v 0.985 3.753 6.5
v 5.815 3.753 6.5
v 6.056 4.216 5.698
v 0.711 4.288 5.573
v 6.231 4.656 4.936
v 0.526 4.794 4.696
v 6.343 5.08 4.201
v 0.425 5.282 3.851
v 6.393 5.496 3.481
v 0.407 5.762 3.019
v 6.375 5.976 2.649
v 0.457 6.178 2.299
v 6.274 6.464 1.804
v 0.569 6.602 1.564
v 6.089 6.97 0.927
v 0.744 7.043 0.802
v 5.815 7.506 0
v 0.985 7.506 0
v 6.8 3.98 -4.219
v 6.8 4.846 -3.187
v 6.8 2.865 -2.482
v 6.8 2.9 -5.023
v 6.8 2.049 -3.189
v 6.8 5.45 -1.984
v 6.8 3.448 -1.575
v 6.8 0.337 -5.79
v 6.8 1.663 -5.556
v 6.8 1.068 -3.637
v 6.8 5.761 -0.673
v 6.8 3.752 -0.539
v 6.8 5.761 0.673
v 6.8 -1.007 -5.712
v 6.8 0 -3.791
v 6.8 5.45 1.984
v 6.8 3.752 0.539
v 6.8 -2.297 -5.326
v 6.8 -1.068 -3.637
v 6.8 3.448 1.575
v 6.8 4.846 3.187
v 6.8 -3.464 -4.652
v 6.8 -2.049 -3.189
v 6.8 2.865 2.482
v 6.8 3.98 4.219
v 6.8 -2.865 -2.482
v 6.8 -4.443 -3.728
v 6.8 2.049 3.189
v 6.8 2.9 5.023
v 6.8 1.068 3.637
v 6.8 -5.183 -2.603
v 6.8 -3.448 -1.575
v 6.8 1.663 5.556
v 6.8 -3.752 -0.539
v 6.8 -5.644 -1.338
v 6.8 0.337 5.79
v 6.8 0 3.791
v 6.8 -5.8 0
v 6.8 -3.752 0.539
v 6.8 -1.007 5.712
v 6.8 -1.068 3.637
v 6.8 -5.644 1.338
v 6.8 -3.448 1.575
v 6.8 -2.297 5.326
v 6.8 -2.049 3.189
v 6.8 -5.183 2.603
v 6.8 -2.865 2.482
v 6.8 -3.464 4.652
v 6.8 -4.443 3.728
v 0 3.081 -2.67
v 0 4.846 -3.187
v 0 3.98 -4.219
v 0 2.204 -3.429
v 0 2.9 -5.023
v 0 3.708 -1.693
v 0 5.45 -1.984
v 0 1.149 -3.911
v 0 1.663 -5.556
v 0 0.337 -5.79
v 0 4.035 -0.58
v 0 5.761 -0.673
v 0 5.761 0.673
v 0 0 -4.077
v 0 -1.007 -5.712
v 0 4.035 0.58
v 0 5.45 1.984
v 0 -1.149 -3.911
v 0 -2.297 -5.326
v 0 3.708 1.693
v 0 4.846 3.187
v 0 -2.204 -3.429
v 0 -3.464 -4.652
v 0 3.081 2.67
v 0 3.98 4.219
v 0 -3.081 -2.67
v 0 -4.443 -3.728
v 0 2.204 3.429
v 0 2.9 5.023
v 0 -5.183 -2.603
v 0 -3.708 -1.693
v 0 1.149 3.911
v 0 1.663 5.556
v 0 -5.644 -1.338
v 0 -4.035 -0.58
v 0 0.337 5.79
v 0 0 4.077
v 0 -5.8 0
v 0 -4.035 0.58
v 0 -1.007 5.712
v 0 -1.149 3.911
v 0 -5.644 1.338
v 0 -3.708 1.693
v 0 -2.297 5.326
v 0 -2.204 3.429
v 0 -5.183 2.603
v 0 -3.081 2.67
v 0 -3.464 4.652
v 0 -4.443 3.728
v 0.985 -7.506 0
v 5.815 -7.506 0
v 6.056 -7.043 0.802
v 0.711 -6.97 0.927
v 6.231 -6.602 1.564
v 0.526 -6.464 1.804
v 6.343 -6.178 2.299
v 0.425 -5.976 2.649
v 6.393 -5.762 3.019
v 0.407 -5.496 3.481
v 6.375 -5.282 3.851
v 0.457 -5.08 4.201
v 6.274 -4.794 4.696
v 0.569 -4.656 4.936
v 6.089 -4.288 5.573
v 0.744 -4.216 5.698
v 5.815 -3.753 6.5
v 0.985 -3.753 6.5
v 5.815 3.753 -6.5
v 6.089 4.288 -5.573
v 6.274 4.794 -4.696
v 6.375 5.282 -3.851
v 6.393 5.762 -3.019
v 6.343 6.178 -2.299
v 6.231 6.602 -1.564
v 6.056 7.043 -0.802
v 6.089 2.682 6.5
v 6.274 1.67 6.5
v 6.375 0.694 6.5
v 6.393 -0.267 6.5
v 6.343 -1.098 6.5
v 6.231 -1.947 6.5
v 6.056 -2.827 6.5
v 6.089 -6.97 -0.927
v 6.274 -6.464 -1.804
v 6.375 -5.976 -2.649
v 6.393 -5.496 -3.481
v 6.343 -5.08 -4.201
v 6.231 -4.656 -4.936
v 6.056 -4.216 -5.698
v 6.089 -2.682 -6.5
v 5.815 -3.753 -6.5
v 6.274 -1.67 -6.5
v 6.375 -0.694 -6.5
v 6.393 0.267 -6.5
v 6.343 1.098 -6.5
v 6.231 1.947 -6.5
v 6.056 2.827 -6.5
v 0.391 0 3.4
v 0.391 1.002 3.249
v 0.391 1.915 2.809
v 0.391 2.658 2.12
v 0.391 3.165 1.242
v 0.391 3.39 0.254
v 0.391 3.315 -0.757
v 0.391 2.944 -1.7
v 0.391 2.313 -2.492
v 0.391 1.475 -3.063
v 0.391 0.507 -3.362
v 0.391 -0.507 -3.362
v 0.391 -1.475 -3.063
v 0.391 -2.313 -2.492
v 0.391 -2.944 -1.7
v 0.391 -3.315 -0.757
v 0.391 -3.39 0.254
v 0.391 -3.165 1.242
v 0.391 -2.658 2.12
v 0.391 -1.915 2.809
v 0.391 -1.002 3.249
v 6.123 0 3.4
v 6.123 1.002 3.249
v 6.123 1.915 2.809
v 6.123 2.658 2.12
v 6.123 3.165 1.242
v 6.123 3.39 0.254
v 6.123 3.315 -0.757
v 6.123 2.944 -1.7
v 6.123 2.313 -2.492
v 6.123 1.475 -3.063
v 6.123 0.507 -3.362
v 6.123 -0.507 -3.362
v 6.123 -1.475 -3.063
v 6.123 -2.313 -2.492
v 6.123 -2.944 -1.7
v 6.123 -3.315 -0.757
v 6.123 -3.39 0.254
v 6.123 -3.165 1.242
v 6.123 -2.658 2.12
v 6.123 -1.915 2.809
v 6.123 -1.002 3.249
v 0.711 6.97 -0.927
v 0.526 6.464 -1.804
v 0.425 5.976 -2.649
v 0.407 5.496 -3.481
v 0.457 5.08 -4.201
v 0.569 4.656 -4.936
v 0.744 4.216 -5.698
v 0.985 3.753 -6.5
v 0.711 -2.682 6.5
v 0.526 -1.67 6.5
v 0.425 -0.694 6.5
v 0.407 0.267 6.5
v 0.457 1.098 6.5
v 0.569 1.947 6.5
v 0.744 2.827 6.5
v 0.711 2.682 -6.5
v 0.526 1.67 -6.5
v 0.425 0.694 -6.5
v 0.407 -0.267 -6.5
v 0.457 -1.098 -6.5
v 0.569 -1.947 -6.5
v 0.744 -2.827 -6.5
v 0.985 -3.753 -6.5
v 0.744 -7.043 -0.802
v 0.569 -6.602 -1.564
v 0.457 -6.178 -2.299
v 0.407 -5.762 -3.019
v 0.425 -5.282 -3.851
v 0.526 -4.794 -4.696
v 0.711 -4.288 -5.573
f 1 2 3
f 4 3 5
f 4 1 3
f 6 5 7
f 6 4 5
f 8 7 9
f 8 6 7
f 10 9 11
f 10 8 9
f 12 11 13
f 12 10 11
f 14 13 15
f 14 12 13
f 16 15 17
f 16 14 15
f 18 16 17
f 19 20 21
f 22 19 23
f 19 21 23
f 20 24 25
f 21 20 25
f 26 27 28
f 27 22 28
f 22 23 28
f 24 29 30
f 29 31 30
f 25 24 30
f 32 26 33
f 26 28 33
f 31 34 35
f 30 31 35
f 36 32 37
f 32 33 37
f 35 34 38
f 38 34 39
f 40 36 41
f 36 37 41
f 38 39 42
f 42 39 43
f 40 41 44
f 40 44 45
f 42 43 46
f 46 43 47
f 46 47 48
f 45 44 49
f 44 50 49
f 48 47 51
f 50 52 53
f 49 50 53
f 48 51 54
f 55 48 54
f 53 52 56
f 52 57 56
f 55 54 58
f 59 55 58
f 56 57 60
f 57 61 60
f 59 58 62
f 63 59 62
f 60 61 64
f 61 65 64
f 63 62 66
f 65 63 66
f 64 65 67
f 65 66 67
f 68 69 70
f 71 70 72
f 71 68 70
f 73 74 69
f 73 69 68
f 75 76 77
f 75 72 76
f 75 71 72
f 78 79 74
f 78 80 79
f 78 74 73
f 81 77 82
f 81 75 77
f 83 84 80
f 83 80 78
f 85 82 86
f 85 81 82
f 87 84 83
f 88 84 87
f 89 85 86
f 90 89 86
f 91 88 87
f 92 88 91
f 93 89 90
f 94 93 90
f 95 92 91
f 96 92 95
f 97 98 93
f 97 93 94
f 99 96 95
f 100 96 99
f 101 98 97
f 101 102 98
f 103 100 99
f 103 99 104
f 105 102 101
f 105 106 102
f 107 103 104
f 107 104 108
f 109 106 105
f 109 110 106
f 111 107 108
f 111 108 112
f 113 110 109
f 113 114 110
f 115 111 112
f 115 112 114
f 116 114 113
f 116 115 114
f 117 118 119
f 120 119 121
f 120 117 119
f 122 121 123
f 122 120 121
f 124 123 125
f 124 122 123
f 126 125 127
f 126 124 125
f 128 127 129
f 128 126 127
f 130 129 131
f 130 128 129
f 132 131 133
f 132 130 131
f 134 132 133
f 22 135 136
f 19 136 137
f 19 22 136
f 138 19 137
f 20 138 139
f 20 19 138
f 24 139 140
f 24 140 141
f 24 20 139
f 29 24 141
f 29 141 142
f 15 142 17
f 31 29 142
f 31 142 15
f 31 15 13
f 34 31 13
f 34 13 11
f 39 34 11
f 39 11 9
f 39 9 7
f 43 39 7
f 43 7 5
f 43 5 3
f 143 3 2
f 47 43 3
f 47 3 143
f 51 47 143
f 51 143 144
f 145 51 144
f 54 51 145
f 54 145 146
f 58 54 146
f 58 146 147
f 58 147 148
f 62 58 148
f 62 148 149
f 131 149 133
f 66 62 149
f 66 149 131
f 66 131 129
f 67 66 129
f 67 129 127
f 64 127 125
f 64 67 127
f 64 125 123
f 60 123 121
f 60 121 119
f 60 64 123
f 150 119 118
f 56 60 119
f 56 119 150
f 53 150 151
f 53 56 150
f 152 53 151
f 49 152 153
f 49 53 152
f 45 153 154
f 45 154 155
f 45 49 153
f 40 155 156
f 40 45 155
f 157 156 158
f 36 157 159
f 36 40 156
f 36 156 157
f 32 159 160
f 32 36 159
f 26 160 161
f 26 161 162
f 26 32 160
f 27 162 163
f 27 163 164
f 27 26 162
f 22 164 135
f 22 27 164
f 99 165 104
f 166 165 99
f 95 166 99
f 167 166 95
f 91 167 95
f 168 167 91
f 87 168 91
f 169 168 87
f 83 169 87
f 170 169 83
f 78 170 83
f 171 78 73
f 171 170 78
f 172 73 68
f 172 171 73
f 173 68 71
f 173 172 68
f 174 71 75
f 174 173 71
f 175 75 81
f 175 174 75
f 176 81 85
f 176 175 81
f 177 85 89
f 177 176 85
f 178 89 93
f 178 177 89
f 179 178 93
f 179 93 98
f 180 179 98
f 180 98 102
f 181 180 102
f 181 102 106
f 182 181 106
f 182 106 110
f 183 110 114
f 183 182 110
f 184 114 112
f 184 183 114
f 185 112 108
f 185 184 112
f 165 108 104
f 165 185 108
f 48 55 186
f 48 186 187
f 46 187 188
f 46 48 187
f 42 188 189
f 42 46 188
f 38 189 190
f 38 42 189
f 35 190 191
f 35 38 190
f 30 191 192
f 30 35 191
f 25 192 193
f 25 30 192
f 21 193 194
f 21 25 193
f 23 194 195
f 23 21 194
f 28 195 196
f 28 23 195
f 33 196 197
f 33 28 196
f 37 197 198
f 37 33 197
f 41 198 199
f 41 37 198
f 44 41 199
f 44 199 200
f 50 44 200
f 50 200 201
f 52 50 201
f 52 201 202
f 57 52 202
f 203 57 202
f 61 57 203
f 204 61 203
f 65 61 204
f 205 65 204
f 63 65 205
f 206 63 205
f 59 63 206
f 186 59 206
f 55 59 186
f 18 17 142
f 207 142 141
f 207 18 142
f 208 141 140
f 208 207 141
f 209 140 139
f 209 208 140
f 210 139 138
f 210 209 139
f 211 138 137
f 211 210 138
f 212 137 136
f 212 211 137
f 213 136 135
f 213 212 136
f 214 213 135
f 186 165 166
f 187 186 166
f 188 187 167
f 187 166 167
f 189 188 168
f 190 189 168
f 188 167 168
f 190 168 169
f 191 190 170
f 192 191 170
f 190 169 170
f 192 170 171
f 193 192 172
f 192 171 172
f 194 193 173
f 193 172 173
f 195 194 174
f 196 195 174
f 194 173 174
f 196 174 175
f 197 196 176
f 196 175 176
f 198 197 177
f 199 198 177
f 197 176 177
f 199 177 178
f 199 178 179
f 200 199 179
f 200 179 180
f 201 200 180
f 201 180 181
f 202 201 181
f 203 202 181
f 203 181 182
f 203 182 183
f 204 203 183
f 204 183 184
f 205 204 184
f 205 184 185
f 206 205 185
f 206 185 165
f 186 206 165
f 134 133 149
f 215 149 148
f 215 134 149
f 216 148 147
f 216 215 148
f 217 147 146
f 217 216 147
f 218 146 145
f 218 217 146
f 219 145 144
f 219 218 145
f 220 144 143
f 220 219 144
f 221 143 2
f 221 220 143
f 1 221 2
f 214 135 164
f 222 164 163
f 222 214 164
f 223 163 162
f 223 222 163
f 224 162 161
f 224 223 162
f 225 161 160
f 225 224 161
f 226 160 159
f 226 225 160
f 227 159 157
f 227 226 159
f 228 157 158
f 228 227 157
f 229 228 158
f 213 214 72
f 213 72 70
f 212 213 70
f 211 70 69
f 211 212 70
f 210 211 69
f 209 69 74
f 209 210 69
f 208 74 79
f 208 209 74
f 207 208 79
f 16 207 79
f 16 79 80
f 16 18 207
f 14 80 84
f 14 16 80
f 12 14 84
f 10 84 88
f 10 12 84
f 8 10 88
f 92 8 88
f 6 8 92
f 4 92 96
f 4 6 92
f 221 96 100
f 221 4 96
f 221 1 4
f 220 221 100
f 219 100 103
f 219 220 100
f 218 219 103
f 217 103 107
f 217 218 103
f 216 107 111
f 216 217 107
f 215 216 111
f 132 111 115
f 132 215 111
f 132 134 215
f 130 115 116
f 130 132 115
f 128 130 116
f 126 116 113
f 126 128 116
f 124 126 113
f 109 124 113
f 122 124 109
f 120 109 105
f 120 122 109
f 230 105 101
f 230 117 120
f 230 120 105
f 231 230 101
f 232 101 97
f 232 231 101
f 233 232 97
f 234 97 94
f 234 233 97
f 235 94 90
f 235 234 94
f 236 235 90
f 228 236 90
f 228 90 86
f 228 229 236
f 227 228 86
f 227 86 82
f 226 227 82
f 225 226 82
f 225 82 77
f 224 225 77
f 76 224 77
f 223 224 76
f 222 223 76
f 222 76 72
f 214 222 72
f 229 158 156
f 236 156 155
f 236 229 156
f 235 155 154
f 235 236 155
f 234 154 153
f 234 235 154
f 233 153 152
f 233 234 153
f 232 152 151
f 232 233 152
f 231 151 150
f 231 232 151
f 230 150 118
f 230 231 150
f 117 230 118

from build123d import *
from OCP.BRepFilletAPI import BRepFilletAPI_MakeChamfer

# Parameters (mm, degrees)
BODY_DEPTH     = 6.8
THREAD_D       = 6.8
CHAMFER3_SIZE  = 0.676582347
CHAMFER3_SIZE2 = 0.390625


with BuildPart() as part:
    # Sketch1 → Body (new body)
    with BuildSketch(Plane.YZ):
        Polygon((-7.505553499, 0), (-3.75277675, 6.5), (3.75277675, 6.5), (7.505553499, 0), (3.75277675, -6.5), (-3.75277675, -6.5), align=None)
    extrude(amount=BODY_DEPTH)

    # Sketch2 → Chamfer1 (revolve, cut)
    with BuildSketch(Plane.XY, mode=Mode.PRIVATE) as chamfer1_sk:
        Polygon((0, 5.8), (0.984701772, 7.505553499), (0, 7.505553499), align=None)
        Polygon((6.8, 5.8), (6.8, 7.505553499), (5.815298228, 7.505553499), align=None)
    revolve(chamfer1_sk.sketch.rotate(Axis((-1.36, 0, 0), (1, 0, 0)), 299.999999999), axis=Axis((-1.36, 0, 0), (1, 0, 0)), mode=Mode.SUBTRACT)

    # Thread (through all)
    with Locations(Plane(origin=(6.8, 0, 0), x_dir=(0, 0, -1), z_dir=(1, 0, 0))):
        with Locations((0, 0)):
            Hole(THREAD_D / 2)

    # Chamfer3: one chamfer whose edges measure the first distance from different faces: ONE call of the kernel's chamfer builder (chamfer() names one face for all edges)
    chamfer3_edges_1 = [part.edges().sort_by_distance(p)[0] for p in [
        (6.8, 0, -3.4),
    ]]
    chamfer3_side_1 = [part.faces().sort_by_distance(p)[0] for p in [
        (3.4, 0, -3.4),
    ]]
    chamfer3_edges_2 = [part.edges().sort_by_distance(p)[0] for p in [
        (0, 0, -3.4),
    ]]
    chamfer3_side_2 = [part.faces().sort_by_distance(p)[0] for p in [
        (0, -2.817975613, 4.880876937),
    ]]
    chamfer3 = BRepFilletAPI_MakeChamfer(part.part.solid().wrapped)
    for e in chamfer3_edges_1:
        chamfer3.Add(CHAMFER3_SIZE, CHAMFER3_SIZE2, e.wrapped, chamfer3_side_1[0].wrapped)  # the first distance lies on this face
    for e in chamfer3_edges_2:
        chamfer3.Add(CHAMFER3_SIZE, CHAMFER3_SIZE2, e.wrapped, chamfer3_side_2[0].wrapped)  # the first distance lies on this face
    add(Compound.cast(chamfer3.Shape()), mode=Mode.REPLACE)


solid = part.part
